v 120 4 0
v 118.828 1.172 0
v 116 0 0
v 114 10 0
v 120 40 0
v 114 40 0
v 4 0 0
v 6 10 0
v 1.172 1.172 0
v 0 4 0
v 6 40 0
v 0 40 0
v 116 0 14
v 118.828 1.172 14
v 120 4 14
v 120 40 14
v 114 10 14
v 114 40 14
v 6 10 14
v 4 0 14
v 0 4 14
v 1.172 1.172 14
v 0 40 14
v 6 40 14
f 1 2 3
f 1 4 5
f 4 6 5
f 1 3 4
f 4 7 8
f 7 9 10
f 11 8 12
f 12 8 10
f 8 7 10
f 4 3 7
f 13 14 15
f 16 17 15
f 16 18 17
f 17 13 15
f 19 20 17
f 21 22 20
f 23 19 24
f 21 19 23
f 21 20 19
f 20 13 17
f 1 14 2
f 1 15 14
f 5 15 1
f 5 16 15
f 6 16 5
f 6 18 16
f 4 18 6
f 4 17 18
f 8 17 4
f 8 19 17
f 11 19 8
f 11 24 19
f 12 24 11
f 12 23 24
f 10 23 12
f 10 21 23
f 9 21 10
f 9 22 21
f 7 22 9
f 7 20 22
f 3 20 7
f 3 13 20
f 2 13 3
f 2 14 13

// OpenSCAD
$fn = 32;

// ----------------------------------------------------------------------
// Heat sink frame: 120 x 40 mm frame, 6 mm walls
// ----------------------------------------------------------------------

// --- parameters (mm) ---
profile_height = 14;      // extrusion height
profile_points = 12;      // points of the closed outline

profile = [[0, 4], [1.172, 1.172], [4, 0], [116, 0], [118.828, 1.172], [120, 4], [120, 40], [114, 40], [114, 10], [6, 10], [6, 40], [0, 40]];  // single closed polygon, 12 points, counter clockwise

// --- the one profile operation ---
linear_extrude(height = profile_height) polygon(points = profile);
